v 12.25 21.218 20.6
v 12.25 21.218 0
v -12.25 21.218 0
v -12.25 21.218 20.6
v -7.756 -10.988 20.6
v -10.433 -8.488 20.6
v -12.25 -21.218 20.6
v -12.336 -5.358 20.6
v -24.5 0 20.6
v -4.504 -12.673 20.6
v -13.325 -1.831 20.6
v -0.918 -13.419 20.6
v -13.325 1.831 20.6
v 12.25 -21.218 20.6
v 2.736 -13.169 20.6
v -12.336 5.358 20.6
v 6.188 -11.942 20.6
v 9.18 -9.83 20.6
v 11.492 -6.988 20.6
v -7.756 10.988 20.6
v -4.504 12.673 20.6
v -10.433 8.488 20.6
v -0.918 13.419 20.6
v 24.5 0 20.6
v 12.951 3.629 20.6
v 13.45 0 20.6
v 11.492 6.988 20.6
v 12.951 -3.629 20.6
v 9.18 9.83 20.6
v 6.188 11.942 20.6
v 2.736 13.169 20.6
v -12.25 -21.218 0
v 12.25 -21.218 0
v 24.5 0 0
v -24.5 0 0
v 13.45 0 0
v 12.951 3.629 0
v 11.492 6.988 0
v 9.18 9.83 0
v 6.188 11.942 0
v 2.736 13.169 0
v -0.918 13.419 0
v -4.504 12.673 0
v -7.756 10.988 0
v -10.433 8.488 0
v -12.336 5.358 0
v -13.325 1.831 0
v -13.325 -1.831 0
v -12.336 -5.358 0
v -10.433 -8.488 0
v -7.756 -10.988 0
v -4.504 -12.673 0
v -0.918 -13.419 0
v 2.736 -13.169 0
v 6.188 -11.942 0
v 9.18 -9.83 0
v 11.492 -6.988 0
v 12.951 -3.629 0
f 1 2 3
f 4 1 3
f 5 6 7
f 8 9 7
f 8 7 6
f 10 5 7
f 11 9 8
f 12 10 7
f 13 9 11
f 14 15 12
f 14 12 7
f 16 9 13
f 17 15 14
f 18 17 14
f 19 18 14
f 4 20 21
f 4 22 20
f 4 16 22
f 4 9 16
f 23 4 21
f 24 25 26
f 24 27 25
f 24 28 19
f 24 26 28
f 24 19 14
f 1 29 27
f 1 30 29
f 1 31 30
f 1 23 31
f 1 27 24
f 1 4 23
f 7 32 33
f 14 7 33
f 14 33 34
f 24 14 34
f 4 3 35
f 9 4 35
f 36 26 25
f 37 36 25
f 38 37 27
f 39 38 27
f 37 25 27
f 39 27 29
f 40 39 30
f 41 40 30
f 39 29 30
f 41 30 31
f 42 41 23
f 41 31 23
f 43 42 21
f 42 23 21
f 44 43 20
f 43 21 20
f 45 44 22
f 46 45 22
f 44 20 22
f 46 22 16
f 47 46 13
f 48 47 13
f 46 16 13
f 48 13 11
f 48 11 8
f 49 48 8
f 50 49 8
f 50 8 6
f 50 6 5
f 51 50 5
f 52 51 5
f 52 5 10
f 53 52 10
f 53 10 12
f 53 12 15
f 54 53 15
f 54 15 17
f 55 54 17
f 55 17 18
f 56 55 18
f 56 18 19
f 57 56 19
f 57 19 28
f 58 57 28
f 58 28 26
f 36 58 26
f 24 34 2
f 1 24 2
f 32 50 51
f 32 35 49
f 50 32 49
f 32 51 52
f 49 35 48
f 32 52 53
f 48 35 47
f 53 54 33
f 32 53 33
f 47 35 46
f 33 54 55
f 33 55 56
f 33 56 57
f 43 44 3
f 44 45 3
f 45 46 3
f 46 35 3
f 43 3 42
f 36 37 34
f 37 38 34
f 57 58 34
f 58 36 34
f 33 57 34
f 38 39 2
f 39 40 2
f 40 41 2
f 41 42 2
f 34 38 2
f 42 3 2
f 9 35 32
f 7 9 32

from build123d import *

# Parameters (mm, degrees)
F1_DEPTH  = 20.6
F2_R      = 13.45
F3_DEPTH  = 25
F3_FACE_R = 13.45
F4_DEPTH  = 45.601


with BuildPart() as f1:
    # F0 (on Top) → F1 (new body)
    with BuildSketch(Plane.XY):
        Polygon((-12.25, -21.217622), (12.25, -21.217622), (24.5, 0), (12.25, 21.217622), (-12.25, 21.217622), (-24.5, 0), align=None)
    extrude(amount=F1_DEPTH)

    # F2 (on face) → F3 (join)
    with BuildSketch(Plane.XY.offset(20.6)):
        Circle(F2_R)
    extrude(amount=F3_DEPTH)

    # F3_face (on face) → F4 (cut, through all)
    with BuildSketch(Plane.XY.offset(45.6)):
        Circle(F3_FACE_R)
    extrude(amount=-F4_DEPTH, mode=Mode.SUBTRACT)


solid = f1.part
